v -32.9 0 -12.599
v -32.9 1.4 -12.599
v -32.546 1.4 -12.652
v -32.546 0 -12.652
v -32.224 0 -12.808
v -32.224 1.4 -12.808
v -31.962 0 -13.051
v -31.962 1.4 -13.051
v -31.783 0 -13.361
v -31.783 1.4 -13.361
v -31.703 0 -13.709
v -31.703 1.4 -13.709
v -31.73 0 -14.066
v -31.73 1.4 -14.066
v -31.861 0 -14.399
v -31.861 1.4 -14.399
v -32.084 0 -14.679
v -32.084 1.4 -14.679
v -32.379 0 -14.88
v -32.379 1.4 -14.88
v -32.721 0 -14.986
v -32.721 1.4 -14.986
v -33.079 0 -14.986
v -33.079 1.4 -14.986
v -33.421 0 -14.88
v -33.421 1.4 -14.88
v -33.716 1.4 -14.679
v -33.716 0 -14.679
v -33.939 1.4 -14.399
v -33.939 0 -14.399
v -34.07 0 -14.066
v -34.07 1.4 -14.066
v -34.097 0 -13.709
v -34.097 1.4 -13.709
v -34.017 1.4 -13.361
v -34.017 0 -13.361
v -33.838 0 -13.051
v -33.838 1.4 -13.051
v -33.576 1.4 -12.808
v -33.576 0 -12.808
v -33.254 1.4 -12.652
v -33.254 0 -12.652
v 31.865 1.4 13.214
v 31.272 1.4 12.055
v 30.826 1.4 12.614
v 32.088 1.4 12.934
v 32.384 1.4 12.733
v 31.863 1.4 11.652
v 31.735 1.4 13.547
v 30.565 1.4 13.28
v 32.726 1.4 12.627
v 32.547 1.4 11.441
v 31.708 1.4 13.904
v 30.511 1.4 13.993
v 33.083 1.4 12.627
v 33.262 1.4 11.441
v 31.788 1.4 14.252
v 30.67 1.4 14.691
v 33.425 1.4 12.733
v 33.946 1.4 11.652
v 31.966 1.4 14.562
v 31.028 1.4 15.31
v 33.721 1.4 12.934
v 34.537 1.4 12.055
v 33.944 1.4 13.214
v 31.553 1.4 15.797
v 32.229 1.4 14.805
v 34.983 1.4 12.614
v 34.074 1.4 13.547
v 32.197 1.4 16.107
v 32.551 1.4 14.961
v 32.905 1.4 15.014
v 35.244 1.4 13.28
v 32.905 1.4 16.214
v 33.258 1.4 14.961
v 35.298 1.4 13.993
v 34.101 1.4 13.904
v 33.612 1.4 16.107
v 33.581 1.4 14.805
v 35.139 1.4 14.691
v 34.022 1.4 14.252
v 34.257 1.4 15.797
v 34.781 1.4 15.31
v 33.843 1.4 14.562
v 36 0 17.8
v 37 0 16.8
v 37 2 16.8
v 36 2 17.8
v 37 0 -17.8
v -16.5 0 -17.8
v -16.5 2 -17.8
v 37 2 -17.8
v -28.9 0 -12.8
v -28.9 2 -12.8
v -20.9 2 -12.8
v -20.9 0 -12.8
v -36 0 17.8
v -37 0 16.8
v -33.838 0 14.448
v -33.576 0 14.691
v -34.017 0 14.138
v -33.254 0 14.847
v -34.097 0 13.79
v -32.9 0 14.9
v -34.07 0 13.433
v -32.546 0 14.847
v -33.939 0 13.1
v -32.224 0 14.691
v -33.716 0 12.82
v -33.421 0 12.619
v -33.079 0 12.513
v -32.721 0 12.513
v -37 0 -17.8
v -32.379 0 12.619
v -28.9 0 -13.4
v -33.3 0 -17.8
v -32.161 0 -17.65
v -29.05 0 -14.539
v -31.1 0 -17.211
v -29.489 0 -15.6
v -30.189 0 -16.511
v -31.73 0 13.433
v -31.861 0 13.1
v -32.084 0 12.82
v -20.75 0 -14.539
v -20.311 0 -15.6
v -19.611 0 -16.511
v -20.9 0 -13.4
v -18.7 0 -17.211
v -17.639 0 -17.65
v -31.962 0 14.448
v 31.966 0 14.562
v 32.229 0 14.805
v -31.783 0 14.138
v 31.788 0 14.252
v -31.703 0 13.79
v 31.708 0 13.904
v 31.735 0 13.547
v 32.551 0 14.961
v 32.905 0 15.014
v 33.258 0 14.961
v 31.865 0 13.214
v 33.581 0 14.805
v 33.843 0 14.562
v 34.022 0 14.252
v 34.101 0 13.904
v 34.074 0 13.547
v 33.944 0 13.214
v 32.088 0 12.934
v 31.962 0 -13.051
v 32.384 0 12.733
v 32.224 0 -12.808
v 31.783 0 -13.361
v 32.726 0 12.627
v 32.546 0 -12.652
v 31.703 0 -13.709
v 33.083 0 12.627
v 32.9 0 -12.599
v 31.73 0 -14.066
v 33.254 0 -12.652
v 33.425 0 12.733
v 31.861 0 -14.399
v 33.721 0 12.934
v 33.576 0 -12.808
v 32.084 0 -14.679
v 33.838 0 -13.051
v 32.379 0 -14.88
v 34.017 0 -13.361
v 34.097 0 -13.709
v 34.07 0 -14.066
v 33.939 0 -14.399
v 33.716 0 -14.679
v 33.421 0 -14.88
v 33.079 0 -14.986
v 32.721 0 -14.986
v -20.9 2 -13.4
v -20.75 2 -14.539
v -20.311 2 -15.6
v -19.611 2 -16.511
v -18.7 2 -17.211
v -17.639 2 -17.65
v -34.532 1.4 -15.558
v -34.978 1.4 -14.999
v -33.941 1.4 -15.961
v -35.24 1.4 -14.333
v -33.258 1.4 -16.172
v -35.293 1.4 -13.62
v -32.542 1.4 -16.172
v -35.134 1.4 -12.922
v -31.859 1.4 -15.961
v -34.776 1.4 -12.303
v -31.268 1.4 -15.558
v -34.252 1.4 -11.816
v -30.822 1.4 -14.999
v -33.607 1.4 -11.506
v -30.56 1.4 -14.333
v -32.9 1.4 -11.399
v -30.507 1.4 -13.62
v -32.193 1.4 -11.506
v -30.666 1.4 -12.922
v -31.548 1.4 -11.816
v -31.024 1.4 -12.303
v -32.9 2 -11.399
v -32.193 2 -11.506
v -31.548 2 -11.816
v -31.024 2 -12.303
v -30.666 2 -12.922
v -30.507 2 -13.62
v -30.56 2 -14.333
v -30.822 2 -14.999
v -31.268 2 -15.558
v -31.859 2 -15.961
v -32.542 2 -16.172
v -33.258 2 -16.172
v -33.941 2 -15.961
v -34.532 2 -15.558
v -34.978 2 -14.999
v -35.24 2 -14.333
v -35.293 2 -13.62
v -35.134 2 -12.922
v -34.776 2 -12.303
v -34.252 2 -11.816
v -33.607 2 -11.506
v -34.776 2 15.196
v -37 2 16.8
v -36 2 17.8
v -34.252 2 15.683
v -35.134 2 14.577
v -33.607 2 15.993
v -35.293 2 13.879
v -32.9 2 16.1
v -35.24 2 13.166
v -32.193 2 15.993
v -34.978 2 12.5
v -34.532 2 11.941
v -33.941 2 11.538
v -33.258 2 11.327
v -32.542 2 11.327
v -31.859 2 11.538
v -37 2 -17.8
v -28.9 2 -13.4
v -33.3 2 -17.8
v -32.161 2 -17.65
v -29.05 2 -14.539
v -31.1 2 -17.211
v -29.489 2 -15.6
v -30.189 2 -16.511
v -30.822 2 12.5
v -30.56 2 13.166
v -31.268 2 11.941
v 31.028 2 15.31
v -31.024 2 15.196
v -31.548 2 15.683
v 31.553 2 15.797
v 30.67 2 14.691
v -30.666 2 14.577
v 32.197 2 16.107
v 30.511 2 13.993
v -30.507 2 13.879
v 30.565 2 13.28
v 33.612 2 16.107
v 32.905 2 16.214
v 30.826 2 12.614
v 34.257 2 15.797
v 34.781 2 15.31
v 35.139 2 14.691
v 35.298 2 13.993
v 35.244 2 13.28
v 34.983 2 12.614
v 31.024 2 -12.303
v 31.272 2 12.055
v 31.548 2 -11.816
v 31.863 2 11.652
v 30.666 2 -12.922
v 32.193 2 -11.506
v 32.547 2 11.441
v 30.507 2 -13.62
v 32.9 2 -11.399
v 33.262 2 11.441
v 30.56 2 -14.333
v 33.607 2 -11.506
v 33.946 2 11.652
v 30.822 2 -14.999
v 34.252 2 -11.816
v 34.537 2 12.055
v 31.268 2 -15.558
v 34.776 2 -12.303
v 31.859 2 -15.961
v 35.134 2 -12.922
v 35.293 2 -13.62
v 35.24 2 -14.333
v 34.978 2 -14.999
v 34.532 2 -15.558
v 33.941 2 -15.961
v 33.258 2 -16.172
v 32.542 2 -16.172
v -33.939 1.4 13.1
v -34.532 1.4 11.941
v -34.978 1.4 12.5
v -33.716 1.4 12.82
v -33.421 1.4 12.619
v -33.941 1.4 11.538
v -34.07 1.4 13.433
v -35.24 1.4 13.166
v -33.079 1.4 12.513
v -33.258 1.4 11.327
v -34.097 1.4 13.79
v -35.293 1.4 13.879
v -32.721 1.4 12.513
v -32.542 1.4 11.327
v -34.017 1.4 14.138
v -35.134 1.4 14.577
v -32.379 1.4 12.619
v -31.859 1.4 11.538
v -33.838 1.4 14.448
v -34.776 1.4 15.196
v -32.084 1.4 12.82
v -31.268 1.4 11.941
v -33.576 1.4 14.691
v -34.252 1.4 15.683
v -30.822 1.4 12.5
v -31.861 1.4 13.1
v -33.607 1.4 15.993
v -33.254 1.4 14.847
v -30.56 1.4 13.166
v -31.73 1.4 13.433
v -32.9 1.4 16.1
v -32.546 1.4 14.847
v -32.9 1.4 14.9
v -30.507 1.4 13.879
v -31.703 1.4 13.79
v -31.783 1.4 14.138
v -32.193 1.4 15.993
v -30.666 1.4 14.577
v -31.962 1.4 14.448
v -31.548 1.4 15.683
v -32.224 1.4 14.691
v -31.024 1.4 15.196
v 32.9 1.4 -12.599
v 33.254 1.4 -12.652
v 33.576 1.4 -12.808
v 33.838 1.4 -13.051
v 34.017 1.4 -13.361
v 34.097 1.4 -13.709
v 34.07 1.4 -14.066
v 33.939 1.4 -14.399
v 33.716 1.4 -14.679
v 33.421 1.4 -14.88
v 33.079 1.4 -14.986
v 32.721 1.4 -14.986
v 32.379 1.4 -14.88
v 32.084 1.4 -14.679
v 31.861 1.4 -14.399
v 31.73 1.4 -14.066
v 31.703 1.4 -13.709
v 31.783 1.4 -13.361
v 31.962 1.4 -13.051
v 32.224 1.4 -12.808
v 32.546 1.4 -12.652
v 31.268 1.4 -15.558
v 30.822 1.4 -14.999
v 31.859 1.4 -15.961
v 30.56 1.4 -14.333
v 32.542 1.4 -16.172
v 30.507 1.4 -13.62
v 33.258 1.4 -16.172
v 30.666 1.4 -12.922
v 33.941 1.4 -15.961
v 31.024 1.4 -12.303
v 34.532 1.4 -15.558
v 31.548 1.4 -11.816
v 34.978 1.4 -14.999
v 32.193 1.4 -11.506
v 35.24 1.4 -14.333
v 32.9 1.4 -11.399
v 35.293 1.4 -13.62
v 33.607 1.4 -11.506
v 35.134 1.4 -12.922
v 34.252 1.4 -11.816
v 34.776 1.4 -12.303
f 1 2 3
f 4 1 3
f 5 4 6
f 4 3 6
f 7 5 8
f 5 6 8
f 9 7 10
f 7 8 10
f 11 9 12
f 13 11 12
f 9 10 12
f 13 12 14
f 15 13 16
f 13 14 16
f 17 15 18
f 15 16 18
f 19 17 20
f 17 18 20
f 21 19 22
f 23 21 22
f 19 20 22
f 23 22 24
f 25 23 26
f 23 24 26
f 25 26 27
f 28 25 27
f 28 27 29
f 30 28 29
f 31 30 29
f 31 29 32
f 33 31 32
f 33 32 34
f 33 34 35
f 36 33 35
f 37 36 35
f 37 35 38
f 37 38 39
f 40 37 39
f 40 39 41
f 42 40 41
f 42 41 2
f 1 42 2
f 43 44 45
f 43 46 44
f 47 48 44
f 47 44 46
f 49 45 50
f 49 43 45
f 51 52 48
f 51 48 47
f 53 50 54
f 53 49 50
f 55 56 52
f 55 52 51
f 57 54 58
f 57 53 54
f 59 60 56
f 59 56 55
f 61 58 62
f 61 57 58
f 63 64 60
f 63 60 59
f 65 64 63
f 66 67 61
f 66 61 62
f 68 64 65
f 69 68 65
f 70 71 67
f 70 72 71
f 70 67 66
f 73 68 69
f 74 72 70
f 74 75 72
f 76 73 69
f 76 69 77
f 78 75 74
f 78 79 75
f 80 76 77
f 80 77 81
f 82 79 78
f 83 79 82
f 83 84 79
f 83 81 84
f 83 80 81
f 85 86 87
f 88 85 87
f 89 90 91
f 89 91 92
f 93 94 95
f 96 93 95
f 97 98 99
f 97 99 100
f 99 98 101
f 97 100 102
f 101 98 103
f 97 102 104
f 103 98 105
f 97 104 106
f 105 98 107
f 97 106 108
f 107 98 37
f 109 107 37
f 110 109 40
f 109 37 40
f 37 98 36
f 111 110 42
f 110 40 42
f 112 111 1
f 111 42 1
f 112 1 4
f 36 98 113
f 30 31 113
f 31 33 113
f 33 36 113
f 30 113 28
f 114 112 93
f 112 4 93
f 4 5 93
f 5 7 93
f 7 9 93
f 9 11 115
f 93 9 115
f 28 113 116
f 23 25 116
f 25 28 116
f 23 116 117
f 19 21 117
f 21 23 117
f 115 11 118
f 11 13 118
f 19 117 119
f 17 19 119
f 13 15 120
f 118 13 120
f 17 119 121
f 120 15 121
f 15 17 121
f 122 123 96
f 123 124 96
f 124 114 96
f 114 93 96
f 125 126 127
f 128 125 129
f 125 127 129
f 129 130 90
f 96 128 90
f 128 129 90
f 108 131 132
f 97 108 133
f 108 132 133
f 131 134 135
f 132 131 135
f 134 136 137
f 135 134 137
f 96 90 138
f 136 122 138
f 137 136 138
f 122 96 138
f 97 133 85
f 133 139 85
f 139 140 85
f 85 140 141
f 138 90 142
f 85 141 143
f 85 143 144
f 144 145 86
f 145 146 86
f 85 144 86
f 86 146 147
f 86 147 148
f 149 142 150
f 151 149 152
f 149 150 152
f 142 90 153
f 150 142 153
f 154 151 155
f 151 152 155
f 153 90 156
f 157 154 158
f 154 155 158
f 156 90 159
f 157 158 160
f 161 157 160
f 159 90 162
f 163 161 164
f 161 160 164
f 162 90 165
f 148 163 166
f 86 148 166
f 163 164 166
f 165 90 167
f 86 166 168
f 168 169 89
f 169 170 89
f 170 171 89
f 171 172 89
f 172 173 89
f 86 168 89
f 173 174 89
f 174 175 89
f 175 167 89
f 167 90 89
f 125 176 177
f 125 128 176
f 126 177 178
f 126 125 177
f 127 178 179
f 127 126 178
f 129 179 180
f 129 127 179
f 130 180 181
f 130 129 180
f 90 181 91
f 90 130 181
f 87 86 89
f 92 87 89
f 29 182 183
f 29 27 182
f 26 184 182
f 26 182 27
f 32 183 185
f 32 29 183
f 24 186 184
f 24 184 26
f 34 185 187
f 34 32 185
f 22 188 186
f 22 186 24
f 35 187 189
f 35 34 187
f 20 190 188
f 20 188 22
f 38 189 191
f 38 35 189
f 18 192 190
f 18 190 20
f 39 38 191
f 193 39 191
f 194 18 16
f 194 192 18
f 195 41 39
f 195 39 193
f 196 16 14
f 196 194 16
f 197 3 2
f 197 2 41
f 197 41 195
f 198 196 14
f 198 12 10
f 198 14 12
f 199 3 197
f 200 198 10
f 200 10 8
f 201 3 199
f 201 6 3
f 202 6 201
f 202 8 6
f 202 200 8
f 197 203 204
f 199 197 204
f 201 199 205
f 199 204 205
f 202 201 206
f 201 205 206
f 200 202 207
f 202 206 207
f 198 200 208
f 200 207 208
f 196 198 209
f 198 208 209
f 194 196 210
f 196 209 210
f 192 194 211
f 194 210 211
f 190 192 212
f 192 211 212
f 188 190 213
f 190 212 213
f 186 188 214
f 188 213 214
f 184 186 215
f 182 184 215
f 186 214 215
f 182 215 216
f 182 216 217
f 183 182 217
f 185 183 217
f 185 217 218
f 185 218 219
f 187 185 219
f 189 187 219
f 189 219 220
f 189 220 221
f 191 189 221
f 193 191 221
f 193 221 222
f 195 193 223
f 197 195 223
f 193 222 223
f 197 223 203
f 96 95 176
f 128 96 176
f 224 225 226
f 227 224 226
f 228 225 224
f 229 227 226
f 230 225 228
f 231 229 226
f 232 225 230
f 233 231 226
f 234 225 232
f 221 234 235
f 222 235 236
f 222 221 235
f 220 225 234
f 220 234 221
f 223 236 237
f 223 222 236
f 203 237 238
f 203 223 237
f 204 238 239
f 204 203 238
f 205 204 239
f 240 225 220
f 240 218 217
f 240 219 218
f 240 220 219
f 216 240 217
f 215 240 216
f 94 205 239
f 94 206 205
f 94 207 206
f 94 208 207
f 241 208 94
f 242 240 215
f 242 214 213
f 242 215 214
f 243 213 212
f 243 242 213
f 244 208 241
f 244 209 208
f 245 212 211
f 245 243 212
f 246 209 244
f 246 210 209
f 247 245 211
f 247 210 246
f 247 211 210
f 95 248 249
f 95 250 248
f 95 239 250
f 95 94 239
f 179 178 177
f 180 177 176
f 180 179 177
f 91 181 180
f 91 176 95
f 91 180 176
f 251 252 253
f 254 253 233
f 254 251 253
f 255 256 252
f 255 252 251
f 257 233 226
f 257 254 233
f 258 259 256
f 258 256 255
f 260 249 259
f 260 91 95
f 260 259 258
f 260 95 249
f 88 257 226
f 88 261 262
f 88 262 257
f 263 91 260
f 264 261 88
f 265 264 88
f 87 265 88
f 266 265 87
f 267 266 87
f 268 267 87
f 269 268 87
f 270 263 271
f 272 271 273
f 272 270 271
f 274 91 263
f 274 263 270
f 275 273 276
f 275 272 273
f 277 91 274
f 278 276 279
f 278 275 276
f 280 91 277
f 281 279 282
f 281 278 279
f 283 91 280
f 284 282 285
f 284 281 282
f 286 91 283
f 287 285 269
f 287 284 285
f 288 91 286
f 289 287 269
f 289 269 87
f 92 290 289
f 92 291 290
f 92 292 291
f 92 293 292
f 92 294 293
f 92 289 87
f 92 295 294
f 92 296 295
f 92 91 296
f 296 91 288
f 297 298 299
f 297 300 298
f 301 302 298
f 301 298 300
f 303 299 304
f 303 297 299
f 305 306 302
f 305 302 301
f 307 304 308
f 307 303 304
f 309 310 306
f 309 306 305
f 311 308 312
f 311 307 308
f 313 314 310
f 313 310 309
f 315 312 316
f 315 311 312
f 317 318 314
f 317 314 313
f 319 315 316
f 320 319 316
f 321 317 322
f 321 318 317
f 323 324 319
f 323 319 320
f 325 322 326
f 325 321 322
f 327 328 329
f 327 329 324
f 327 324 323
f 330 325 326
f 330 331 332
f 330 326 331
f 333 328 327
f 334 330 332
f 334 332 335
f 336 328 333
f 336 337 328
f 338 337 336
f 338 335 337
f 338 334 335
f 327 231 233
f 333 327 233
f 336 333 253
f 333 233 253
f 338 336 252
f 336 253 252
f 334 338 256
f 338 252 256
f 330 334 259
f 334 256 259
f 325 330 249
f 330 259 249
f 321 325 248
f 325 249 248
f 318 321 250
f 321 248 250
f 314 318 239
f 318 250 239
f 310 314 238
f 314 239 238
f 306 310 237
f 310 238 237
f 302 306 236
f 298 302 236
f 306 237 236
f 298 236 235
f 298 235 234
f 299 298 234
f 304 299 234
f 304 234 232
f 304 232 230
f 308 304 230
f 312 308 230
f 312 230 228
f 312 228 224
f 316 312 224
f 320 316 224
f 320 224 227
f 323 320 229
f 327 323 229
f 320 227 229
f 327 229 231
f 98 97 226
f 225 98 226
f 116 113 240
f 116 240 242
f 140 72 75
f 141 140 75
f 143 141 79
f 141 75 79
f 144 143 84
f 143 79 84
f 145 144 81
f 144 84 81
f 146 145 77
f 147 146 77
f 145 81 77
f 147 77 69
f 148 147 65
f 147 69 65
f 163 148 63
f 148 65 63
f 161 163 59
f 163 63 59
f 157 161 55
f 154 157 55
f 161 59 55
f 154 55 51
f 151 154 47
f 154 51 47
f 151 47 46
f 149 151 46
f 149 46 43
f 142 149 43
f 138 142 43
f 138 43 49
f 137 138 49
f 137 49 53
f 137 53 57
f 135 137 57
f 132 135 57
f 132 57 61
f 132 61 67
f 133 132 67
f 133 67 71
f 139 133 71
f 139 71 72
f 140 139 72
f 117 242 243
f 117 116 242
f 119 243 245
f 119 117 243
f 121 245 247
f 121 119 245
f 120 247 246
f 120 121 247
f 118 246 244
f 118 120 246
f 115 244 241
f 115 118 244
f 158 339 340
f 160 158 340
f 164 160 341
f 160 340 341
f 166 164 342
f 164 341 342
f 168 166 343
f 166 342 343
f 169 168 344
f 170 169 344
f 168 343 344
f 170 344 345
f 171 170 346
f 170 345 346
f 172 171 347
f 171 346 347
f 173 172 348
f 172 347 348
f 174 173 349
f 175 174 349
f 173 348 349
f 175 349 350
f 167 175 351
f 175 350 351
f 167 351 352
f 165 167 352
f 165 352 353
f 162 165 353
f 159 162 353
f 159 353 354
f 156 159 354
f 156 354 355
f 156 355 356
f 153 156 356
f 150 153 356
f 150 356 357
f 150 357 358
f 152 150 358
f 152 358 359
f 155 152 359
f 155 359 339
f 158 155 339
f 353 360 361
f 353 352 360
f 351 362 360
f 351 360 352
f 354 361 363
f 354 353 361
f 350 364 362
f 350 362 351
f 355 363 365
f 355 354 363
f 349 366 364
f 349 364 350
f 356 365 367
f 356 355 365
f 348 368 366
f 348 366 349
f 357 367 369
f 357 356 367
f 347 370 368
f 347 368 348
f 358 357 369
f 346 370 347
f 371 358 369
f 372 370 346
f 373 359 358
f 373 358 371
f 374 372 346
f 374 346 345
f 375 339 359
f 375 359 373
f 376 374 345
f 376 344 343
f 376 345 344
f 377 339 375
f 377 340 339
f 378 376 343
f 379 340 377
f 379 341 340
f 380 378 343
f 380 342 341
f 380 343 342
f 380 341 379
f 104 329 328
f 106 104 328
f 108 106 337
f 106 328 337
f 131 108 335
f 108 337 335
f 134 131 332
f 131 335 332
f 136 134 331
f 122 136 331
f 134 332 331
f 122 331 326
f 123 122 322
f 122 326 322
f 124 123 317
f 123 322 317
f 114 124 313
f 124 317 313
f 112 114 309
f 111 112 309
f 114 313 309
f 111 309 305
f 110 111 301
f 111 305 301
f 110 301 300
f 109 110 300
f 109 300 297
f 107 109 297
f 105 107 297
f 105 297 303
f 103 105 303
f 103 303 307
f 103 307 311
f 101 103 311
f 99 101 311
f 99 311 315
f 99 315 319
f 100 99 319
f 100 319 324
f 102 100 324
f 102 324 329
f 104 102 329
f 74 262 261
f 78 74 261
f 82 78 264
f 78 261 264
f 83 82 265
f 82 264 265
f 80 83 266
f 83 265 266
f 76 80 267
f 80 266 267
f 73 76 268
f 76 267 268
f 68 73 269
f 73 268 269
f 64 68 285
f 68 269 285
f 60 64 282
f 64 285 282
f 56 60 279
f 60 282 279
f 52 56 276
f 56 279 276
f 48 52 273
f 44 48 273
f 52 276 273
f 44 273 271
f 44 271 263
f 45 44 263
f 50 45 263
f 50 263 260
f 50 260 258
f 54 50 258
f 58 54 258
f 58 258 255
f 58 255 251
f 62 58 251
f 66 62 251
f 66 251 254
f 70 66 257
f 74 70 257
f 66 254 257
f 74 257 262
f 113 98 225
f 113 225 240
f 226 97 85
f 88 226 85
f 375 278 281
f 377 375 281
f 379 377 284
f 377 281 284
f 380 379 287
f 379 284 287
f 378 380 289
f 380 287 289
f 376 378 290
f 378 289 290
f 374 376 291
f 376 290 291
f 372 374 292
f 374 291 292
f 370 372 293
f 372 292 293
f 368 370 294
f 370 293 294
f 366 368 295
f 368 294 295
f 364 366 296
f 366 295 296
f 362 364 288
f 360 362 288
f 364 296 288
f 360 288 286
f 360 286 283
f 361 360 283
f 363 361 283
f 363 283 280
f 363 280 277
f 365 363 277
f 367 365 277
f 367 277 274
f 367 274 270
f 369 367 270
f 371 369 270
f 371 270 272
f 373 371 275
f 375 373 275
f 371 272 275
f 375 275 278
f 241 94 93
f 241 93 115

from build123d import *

# Parameters (mm, degrees)
SKETCH_1_W          = 74
SKETCH_1_H          = 35.6
EXTRUDE_1_DEPTH     = 2
CHAMFER_1_SIZE      = 1
SKETCH_2_R          = 1.2
CUT_EXTRUDE_1_DEPTH = 42.107663519
SKETCH_3_R          = 2.4
CUT_EXTRUDE_2_DEPTH = 0.6
SKETCH_5_W          = 8
SKETCH_5_H          = 5
CUT_EXTRUDE_3_DEPTH = 42.107663519
FILLET_1_R          = 4.4


with BuildPart() as part:
    # 草图1 → 凸台-拉伸1 (new body)
    with BuildSketch(Plane(origin=(0, 0, 0), x_dir=(1, 0, 0), z_dir=(0, 1, 0))):
        Rectangle(SKETCH_1_W, SKETCH_1_H)
    extrude(amount=EXTRUDE_1_DEPTH)

    # 倒角1
    chamfer_1_edges = [part.edges().sort_by_distance(p)[0] for p in [
        (37, 1, 17.8),
        (-37, 1, 17.8),
    ]]
    chamfer(chamfer_1_edges, length=CHAMFER_1_SIZE)

    # 草图2 → 切除-拉伸1 (cut, through all)
    with BuildSketch(Plane(origin=(0, 2, 0), x_dir=(1, 0, 0), z_dir=(0, 1, 0))):
        with Locations(Location((32.904560765, -13.813886845, 0), (0, 0, 270))):
            Circle(SKETCH_2_R)
        with Locations(Location((-32.9, -13.7, 0), (0, 0, 270))):
            Circle(SKETCH_2_R)
        with Locations(Location((-32.9, 13.799098008, 0), (0, 0, 270))):
            Circle(SKETCH_2_R)
        with Locations(Location((32.9, 13.799098008, 0), (0, 0, 270))):
            Circle(SKETCH_2_R)
    extrude(amount=-CUT_EXTRUDE_1_DEPTH, mode=Mode.SUBTRACT)

    # 草图3 → 切除-拉伸2 (cut)
    with BuildSketch(Plane(origin=(0, 2, 0), x_dir=(1, 0, 0), z_dir=(0, 1, 0))):
        with Locations(Location((32.904560765, -13.813886845, 0), (0, 0, 270))):
            Circle(SKETCH_3_R)
        with Locations(Location((-32.9, -13.7, 0), (0, 0, 270))):
            Circle(SKETCH_3_R)
        with Locations(Location((32.9, 13.799098008, 0), (0, 0, 270))):
            Circle(SKETCH_3_R)
        with Locations(Location((-32.9, 13.799098008, 0), (0, 0, 270))):
            Circle(SKETCH_3_R)
    extrude(amount=-CUT_EXTRUDE_2_DEPTH, mode=Mode.SUBTRACT)

    # 草图5 → 切除-拉伸3 (cut, through all)
    with BuildSketch(Plane(origin=(0, 2, 0), x_dir=(1, 0, 0), z_dir=(0, 1, 0))):
        with Locations((-24.9, 15.3)):
            Rectangle(SKETCH_5_W, SKETCH_5_H)
    extrude(amount=-CUT_EXTRUDE_3_DEPTH, mode=Mode.SUBTRACT)

    # 圆角1
    fillet_1_edges = [part.edges().sort_by_distance(p)[0] for p in [
        (-20.9, 1, -17.8),
        (-28.9, 1, -17.8),
    ]]
    fillet(fillet_1_edges, radius=FILLET_1_R)


solid = part.part
